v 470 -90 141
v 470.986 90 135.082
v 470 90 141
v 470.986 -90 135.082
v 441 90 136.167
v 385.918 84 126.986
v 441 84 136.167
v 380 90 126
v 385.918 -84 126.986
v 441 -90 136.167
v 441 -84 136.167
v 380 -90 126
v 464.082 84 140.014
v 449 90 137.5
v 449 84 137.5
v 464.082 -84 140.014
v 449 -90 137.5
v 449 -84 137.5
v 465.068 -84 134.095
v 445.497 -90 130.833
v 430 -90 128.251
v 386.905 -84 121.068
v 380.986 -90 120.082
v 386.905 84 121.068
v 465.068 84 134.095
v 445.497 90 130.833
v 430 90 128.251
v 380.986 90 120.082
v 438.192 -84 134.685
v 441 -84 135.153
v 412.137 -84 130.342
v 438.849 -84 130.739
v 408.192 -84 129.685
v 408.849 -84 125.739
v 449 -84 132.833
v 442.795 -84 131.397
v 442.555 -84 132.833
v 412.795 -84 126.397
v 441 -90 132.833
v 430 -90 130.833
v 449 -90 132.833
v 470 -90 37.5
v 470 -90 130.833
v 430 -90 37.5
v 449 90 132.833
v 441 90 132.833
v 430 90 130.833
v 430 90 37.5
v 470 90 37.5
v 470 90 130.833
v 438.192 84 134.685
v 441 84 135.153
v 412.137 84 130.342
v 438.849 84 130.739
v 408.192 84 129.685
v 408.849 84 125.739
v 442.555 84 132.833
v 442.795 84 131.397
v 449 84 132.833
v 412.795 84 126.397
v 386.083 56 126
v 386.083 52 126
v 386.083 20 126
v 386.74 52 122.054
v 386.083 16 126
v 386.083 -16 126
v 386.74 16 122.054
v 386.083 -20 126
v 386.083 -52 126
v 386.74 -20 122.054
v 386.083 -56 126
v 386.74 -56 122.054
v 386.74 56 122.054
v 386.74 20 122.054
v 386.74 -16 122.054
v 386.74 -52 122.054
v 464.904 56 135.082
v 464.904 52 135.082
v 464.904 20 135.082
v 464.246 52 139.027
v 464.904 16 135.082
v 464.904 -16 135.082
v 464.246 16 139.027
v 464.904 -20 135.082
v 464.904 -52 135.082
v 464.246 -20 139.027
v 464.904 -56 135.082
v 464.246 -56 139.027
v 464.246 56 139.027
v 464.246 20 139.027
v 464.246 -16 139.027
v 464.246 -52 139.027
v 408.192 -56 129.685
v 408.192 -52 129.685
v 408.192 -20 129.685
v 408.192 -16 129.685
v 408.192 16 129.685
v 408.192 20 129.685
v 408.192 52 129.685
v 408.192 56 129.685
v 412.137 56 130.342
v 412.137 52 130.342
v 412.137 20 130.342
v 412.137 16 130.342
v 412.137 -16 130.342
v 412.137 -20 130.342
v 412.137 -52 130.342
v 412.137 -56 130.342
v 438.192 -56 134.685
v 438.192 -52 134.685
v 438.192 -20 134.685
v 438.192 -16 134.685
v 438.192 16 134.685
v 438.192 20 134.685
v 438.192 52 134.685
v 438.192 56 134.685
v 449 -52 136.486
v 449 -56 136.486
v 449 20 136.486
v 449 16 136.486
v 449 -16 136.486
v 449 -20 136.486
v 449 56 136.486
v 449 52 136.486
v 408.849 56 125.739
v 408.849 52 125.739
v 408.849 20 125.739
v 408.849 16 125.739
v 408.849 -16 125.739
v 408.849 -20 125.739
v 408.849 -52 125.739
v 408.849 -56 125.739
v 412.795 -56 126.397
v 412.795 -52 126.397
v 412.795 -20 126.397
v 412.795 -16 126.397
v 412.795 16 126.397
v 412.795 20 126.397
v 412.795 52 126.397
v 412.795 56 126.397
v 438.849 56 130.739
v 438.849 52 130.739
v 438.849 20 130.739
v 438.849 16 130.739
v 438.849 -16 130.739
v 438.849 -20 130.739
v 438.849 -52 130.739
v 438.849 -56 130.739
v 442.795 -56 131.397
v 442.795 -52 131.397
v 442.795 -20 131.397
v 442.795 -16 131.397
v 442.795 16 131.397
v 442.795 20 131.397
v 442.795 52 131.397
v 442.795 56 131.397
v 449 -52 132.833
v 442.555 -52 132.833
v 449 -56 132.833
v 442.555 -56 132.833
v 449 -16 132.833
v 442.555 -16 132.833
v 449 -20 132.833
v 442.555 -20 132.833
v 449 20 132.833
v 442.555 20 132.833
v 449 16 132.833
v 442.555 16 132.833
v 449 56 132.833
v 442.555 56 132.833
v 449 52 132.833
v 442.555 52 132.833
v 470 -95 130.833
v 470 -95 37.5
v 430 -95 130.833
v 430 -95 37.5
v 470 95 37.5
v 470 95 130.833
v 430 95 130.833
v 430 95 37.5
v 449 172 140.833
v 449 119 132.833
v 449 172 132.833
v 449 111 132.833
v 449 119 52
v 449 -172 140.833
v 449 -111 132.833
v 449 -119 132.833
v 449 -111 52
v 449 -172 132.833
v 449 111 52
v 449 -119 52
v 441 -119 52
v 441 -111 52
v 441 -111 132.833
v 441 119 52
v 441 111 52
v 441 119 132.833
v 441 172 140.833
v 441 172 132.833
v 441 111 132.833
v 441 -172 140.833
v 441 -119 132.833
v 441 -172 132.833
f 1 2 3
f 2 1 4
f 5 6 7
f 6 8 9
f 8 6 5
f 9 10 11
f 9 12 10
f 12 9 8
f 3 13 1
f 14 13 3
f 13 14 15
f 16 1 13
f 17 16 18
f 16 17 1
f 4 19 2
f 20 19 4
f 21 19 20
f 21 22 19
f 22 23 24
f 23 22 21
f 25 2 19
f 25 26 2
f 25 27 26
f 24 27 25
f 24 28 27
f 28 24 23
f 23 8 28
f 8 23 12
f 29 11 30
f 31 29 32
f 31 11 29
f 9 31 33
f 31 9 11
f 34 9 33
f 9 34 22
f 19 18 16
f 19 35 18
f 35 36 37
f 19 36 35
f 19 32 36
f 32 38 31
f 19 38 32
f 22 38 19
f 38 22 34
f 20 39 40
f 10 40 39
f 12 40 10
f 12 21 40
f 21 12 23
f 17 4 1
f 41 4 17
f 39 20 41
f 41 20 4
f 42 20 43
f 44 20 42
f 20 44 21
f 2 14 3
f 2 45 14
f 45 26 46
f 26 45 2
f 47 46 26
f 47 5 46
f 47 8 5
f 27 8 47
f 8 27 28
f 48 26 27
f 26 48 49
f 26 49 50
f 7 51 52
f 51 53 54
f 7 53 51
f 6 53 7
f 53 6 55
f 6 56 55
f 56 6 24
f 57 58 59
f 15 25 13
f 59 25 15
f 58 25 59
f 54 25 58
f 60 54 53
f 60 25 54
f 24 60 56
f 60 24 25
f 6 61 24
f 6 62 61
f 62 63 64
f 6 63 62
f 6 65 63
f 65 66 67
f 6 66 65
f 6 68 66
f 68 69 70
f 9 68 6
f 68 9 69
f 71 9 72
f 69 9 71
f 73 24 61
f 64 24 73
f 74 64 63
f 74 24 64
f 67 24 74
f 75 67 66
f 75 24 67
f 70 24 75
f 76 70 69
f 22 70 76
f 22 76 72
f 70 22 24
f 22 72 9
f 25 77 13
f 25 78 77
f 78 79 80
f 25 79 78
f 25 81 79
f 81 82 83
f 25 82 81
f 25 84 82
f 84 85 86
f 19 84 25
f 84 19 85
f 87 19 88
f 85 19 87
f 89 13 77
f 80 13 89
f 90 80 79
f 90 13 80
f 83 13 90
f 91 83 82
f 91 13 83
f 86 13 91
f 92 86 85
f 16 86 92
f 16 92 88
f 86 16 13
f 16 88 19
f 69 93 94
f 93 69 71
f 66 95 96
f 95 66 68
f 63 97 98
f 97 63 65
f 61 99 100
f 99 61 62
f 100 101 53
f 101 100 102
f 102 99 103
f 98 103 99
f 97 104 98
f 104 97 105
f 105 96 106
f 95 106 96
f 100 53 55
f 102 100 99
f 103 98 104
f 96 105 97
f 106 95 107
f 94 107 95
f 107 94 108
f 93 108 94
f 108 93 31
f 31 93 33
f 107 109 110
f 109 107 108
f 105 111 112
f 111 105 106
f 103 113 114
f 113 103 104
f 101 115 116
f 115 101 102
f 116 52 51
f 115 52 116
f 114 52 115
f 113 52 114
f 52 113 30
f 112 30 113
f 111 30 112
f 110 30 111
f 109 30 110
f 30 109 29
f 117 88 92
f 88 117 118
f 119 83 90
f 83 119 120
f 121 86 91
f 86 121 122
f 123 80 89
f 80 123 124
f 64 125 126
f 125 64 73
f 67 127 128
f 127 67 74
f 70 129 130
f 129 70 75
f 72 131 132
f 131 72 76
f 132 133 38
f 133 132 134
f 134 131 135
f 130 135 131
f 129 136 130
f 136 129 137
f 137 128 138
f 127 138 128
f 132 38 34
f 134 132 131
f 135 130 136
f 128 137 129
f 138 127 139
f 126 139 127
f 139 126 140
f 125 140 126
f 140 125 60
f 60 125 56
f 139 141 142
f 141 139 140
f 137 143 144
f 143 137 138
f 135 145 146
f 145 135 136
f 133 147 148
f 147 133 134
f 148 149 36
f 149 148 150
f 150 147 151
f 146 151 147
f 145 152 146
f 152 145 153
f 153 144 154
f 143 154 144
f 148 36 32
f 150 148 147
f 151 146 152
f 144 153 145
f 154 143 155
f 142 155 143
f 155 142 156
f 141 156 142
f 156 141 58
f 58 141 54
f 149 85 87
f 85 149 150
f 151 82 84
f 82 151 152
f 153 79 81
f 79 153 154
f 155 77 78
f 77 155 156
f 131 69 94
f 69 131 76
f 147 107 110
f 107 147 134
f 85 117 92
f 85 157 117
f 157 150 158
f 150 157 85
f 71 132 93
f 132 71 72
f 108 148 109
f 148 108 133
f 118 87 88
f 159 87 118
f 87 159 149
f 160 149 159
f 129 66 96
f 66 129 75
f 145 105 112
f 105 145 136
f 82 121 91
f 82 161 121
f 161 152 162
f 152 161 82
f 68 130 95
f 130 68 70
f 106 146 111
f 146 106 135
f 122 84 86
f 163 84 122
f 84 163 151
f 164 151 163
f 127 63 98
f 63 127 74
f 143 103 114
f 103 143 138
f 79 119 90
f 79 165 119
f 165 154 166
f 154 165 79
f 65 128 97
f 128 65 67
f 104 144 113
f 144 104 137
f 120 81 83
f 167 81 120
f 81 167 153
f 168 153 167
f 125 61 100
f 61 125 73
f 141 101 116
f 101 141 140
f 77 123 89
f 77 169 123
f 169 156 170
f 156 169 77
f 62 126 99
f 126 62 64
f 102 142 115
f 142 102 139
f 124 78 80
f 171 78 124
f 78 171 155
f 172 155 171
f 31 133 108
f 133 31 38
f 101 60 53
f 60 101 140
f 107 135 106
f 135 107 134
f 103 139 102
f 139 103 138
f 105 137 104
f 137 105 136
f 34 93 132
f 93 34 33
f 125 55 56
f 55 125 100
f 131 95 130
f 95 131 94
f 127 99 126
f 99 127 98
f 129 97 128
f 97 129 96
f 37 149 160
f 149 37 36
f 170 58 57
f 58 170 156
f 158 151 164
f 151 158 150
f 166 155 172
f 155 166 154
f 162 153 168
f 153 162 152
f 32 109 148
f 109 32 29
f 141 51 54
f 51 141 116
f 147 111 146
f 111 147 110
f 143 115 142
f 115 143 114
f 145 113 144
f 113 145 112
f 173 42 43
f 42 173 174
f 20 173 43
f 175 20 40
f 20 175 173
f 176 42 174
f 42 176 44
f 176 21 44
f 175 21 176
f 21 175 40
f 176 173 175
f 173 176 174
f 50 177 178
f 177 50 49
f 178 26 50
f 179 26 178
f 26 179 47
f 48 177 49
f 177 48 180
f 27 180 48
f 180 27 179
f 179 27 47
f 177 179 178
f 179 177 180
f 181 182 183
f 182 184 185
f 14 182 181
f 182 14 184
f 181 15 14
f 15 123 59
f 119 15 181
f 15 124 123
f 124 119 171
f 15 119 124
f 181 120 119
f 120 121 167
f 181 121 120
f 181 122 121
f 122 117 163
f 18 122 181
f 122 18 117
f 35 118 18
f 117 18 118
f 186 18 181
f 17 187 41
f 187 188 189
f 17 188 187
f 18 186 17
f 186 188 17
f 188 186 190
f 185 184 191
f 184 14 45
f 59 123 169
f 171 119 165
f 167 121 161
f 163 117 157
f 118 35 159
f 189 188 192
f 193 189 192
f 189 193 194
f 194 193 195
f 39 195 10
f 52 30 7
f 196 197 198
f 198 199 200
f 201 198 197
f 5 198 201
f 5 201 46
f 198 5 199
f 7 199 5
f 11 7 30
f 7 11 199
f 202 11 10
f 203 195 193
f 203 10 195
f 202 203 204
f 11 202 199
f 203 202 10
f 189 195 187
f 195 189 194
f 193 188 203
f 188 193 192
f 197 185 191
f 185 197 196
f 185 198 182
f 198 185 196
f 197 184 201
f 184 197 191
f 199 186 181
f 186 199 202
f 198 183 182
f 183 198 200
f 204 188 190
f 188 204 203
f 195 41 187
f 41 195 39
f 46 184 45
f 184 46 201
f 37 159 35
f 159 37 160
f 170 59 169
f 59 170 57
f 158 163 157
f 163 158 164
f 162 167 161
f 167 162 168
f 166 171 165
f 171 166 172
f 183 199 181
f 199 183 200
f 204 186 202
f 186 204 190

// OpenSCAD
// file: lib.scad
// Wire-mesh panel primitives for the basket weldment.
include <params.scad>

// Flat mesh panel in the local XY plane, centered at the origin.
// Perimeter uses frame_d rod, infill uses wire_d at <= mesh_pitch spacing.
// Top face of the panel sits at z = 0 (rods hang below it) so callers can
// position panels by their working surface.
module mesh_panel(lx, ly) {
    nx = max(1, ceil(lx / mesh_pitch));
    ny = max(1, ceil(ly / mesh_pitch));
    translate([0, 0, -frame_d / 2]) {
        // perimeter frame
        for (sy = [-1, 1])
            translate([0, sy * (ly - frame_d) / 2, 0])
                cube([lx, frame_d, frame_d], center = true);
        for (sx = [-1, 1])
            translate([sx * (lx - frame_d) / 2, 0, 0])
                cube([frame_d, ly, frame_d], center = true);
        // infill wires along x
        for (i = [1 : ny - 1])
            translate([0, -ly / 2 + i * ly / ny, 0])
                cube([lx, wire_d, wire_d], center = true);
        // infill wires along y
        for (i = [1 : nx - 1])
            translate([-lx / 2 + i * lx / nx, 0, 0])
                cube([wire_d, ly, wire_d], center = true);
    }
}

// Vertical mesh wall in the local XZ plane (length lx, height hz),
// centered in x, base at z = 0, panel mid-plane at y = 0.
module mesh_wall(lx, hz) {
    translate([0, 0, hz / 2])
        rotate([90, 0, 0])
            mesh_panel(lx, hz);
}

// U-shaped carry handle in the local XZ plane: span in x, rising +z.
module handle(span, rise, rod = 8) {
    for (sx = [-1, 1])
        translate([sx * span / 2, 0, rise / 2])
            cube([rod, rod, rise], center = true);
    translate([0, 0, rise - rod / 2])
        cube([span + rod, rod, rod], center = true);
}
// file: params.scad
// Basket bin v2.1 + entry hood — validated dimensions.
//
// Single source of truth for every file in this directory.
// All values in mm, GROUND frame (z=0 at court surface), robot +x forward.
// Sources: docs/basket-bin-redesign-spec-el.md,
//          ros2_ws/src/tennis_robot/urdf/components/basket.urdf.xacro,
//          debug log #45-#56 (docs/intake-debug-log-el.md).
// Do not change a value here without re-validating in the Gazebo bench.

// ---- Bin interior (spec §2) ----
bin_rear_x       = 20;    // rear interior plane
bin_front_x      = 420;   // front interior plane = retention boundary
bin_half_width   = 140;   // interior half width (280 total)
floor_top_z      = 25;    // sunken floor top (20 mm ground clearance below)
floor_thickness  = 5;
wall_top_z       = 250;   // rim height (below lidar plane 498)
wall_thickness   = 10;    // effective wall envelope in sim

// ---- Load-management tray (spec §2, log #54 low_transition) ----
mgmt_run         = 140;   // rear edge x = bin_front_x - mgmt_run = 280
mgmt_rise        = 10;    // tray top: 25 @ x280 -> 35 @ x420 (~4.1 deg)

// ---- Receiving chute (spec §2) ----
recv_run         = 50;    // x 420 -> 470
recv_rise        = 5;     // top: 35 @ x420 -> 40 @ x470
recv_half_width  = 90;    // 180 mm launch channel

// ---- Front retention (log #51/#52) ----
entry_half_width = 90;    // launch opening half width
guard_height     = 20;    // corner guards, z 25..45, y 90..140 each side
center_lip_height = 10;   // fixed centre lip, z 25..35 (log #52 -> low-transition)

// ---- Entry hood (log #54-#56, now sim default) ----
hood_rear_overhang    = 40;   // roof rear x = bin_front_x - 40 = 380
hood_rear_clearance_z = 120;  // roof underside @ rear edge
hood_front_clearance_z = 135; // roof underside @ front edge (x 470)
hood_cheek_thickness  = 5;

// ---- Wire mesh construction (spec §2: hopper-style mesh) ----
wire_d     = 4;    // mesh wire
frame_d    = 6;    // panel perimeter rod
mesh_pitch = 40;   // grid opening <= 40 (ball 66 cannot pass)

// ---- Chassis context (reference only, spec §3-§4) ----
plate_top_z     = 52;
plate_thickness = 14;
plate_half_len  = 460;   // 920 x 580 chassis
plate_half_wid  = 290;
open_rear_x     = 10;    // plate opening x 10..460, y +/-150
open_front_x    = 460;
open_half_wid   = 150;
flange_width    = 22;    // bin rests on this ring, on the plate top
flange_thickness = 4;

// ---- Sensors / references ----
ir_x       = 445;   // confirmation beam through the chute midpoint
ir_z       = 70.5;
ir_mount_y = 155;   // sensor bodies on the chassis, outside the bin
ball_d     = 66;

// Battery bay (spec §4): 198 x 166 x 170, x -226..-60, centered in y
batt_size  = [166, 198, 170];
batt_min_x = -226;

// Derived (do not edit)
bin_length   = bin_front_x - bin_rear_x;           // 400
wall_height  = wall_top_z - floor_top_z;           // 225
mgmt_rear_x  = bin_front_x - mgmt_run;             // 280
mgmt_angle   = atan2(mgmt_rise, mgmt_run);         // ~4.09 deg
recv_front_x = bin_front_x + recv_run;             // 470
recv_angle   = atan2(recv_rise, recv_run);         // ~5.71 deg
recv_rear_top_z = floor_top_z + mgmt_rise;         // 35
recv_mid_z   = recv_rear_top_z + recv_rise / 2;    // 37.5
hood_rear_x  = bin_front_x - hood_rear_overhang;   // 380
hood_run     = recv_front_x - hood_rear_x;         // 90
hood_rise    = hood_front_clearance_z - hood_rear_clearance_z; // 15
hood_angle   = atan2(hood_rise, hood_run);         // ~9.46 deg
// roof underside height at the cheek midpoint (x = ir_x), xacro hood_side_top_z
hood_side_top_z = hood_rear_clearance_z
    + hood_rise * (ir_x - hood_rear_x) / hood_run; // ~130.8
// main file
// Chassis-mounted entry hood (log #54-#56): inclined mesh roof over the
// receiving chute plus two side cheeks. Stays on the chassis so the bin
// lifts out without touching it. Solved the 45-ball load escapes; rear
// clearance 120 keeps the incoming ball down onto the pile.
include <params.scad>
use <lib.scad>

module hood_roof() {
    len = sqrt(hood_run ^ 2 + hood_rise ^ 2);
    // panel underside = validated clearance plane, so shift one frame_d up
    translate([hood_rear_x, 0, hood_rear_clearance_z + frame_d])
        rotate([0, -hood_angle, 0])
            translate([len / 2, 0, 0])
                mesh_panel(len, 2 * recv_half_width);
}

module hood_cheeks() {
    // close the sides of the launch channel between chute and roof.
    // The sim collision starts at x 420, but that interpenetrates the
    // bin's corner guards (x 420-430) — two separate physical parts.
    // Trim to x 430-470: the leftover 10 mm slot above the guards is
    // far below ball diameter. Documented in README.
    cheek_len = recv_run - wall_thickness;
    for (sy = [-1, 1])
        translate([bin_front_x + wall_thickness + cheek_len / 2,
                   sy * (recv_half_width + hood_cheek_thickness / 2),
                   (recv_mid_z + hood_side_top_z) / 2])
            cube([cheek_len, hood_cheek_thickness,
                  hood_side_top_z - recv_mid_z], center = true);
}

module hood_mounts() {
    // transverse bar over the plate opening, landing on the side strips
    // (|y| >= 150), with two uprights carrying the roof; see README for
    // the alternative funnel-frame mount
    bar_z = hood_rear_clearance_z + frame_d + (ir_x - hood_rear_x) * tan(hood_angle);
    translate([ir_x, 0, plate_top_z + (bar_z - plate_top_z) / 2]) {
        for (sy = [-1, 1])
            translate([0, sy * (recv_half_width + 25), 0])
                cube([frame_d + 2, frame_d + 2, bar_z - plate_top_z],
                     center = true);
    }
    translate([ir_x, 0, bar_z])
        cube([frame_d + 2, 2 * (open_half_wid + flange_width), frame_d + 2],
             center = true);
}

module hood() {
    color("lightsteelblue") {
        hood_roof();
        hood_cheeks();
        hood_mounts();
    }
}

hood();
